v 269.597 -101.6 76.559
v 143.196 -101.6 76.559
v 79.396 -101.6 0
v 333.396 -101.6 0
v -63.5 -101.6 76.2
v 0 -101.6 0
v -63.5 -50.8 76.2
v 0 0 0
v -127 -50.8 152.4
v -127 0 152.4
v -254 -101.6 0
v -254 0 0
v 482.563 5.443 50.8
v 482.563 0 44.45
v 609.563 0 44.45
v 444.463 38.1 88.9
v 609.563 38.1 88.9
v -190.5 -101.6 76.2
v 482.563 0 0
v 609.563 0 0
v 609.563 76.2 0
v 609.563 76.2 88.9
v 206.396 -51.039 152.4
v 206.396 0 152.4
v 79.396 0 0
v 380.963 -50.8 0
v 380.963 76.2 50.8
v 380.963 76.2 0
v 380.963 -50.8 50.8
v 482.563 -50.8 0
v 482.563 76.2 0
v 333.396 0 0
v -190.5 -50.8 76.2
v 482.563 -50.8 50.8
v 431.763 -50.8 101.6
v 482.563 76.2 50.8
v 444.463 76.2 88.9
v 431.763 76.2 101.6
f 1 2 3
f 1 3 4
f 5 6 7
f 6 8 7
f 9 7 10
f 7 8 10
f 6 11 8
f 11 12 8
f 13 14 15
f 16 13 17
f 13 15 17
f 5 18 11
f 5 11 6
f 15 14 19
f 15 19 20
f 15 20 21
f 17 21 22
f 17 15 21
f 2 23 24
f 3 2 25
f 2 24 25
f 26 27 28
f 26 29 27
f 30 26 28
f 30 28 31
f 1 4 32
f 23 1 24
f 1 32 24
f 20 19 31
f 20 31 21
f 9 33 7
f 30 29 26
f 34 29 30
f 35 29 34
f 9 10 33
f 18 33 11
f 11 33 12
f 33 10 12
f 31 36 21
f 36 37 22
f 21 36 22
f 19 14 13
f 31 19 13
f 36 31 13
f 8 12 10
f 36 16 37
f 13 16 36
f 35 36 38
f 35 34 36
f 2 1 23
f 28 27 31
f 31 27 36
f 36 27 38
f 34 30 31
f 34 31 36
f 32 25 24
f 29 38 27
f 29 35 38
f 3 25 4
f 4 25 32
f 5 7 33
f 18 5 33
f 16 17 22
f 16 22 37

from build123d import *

# Parameters (mm, degrees)
F1_DEPTH       = 50.8
F3_DEPTH       = 50.8
F5_DEPTH       = 101.6
F8_DEPTH       = 239.522
F10_DEPTH      = 50.8
F10_DEPTH_BACK = 76.2
F9_W           = 127
F9_H           = 50.8
F11_DEPTH      = 76.2
F12_DEPTH      = 76.2
F14_DEPTH      = 167.386


with BuildPart() as f1:
    # F0 (on Front) → F1 (new body)
    with BuildSketch(Plane.XZ):
        Polygon((-127, 0), (0, 0), (-127, 152.4), align=None)
        Polygon((-254, 0), (-127, 0), (-127, 152.4), align=None)
    extrude(amount=F1_DEPTH)

    # F2 (on face) → F3 (join)
    with BuildSketch(Plane.XZ.offset(50.8)):
        Polygon((-190.5, 76.2), (-254, 0), (-127, 0), (-127, 76.2), align=None)
        Polygon((-127, 76.2), (-127, 0), (0, 0), (-63.5, 76.2), align=None)
    extrude(amount=F3_DEPTH)


with BuildPart() as f5:
    # F4 (on Front) → F5 (new body)
    with BuildSketch(Plane.XZ):
        Polygon((206.3964341254, 152.4), (79.3964341254, 0), (206.3964341254, 0), align=None)
        Polygon((206.3964341254, 152.4), (206.3964341254, 0), (333.3964341254, 0), align=None)
    extrude(amount=F5_DEPTH)

    # F7 (on offset) → F8 (cut)
    with BuildSketch(Plane.YZ.offset(342.138)):
        Polygon((-51.0394626021, 152.4), (-101.8394626021, 152.4), (-101.8394626021, 76.2), align=None)
    extrude(amount=-F8_DEPTH, mode=Mode.SUBTRACT)


with BuildPart() as f10:
    # F9 (on Front) → F10 (new body, two sides)
    with BuildSketch(Plane.XZ) as f10_sk:
        Polygon((380.9625402625, 50.8), (380.9625402625, 0), (431.7625402625, 0), (482.5625402625, 0), (482.5625402625, 50.8), (444.4625402625, 88.9), (431.7625402625, 101.6), align=None)
    extrude(amount=F10_DEPTH)
    extrude(f10_sk.sketch, amount=-F10_DEPTH_BACK)


with BuildPart() as f11:
    # F9 (on Front) → F11 (new body)
    with BuildSketch(Plane.XZ):
        with Locations((546.0625402625, 25.4)):
            Rectangle(F9_W, F9_H)
    extrude(amount=-F11_DEPTH)

    # F9 (on Front) → F12 (join)
    with BuildSketch(Plane.XZ):
        Polygon((444.4625402625, 88.9), (482.5625402625, 50.8), (609.5625402625, 50.8), (609.5625402625, 88.9), align=None)
    extrude(amount=-F12_DEPTH)

    # F13 (on face) → F14 (cut)
    with BuildSketch(Plane.YZ.offset(609.5625402625)):
        Polygon((0, 88.9), (0, 44.45), (38.1, 88.9), align=None)
    extrude(amount=-F14_DEPTH, mode=Mode.SUBTRACT)


solid = Compound([f1.part, f5.part, f10.part, f11.part])
